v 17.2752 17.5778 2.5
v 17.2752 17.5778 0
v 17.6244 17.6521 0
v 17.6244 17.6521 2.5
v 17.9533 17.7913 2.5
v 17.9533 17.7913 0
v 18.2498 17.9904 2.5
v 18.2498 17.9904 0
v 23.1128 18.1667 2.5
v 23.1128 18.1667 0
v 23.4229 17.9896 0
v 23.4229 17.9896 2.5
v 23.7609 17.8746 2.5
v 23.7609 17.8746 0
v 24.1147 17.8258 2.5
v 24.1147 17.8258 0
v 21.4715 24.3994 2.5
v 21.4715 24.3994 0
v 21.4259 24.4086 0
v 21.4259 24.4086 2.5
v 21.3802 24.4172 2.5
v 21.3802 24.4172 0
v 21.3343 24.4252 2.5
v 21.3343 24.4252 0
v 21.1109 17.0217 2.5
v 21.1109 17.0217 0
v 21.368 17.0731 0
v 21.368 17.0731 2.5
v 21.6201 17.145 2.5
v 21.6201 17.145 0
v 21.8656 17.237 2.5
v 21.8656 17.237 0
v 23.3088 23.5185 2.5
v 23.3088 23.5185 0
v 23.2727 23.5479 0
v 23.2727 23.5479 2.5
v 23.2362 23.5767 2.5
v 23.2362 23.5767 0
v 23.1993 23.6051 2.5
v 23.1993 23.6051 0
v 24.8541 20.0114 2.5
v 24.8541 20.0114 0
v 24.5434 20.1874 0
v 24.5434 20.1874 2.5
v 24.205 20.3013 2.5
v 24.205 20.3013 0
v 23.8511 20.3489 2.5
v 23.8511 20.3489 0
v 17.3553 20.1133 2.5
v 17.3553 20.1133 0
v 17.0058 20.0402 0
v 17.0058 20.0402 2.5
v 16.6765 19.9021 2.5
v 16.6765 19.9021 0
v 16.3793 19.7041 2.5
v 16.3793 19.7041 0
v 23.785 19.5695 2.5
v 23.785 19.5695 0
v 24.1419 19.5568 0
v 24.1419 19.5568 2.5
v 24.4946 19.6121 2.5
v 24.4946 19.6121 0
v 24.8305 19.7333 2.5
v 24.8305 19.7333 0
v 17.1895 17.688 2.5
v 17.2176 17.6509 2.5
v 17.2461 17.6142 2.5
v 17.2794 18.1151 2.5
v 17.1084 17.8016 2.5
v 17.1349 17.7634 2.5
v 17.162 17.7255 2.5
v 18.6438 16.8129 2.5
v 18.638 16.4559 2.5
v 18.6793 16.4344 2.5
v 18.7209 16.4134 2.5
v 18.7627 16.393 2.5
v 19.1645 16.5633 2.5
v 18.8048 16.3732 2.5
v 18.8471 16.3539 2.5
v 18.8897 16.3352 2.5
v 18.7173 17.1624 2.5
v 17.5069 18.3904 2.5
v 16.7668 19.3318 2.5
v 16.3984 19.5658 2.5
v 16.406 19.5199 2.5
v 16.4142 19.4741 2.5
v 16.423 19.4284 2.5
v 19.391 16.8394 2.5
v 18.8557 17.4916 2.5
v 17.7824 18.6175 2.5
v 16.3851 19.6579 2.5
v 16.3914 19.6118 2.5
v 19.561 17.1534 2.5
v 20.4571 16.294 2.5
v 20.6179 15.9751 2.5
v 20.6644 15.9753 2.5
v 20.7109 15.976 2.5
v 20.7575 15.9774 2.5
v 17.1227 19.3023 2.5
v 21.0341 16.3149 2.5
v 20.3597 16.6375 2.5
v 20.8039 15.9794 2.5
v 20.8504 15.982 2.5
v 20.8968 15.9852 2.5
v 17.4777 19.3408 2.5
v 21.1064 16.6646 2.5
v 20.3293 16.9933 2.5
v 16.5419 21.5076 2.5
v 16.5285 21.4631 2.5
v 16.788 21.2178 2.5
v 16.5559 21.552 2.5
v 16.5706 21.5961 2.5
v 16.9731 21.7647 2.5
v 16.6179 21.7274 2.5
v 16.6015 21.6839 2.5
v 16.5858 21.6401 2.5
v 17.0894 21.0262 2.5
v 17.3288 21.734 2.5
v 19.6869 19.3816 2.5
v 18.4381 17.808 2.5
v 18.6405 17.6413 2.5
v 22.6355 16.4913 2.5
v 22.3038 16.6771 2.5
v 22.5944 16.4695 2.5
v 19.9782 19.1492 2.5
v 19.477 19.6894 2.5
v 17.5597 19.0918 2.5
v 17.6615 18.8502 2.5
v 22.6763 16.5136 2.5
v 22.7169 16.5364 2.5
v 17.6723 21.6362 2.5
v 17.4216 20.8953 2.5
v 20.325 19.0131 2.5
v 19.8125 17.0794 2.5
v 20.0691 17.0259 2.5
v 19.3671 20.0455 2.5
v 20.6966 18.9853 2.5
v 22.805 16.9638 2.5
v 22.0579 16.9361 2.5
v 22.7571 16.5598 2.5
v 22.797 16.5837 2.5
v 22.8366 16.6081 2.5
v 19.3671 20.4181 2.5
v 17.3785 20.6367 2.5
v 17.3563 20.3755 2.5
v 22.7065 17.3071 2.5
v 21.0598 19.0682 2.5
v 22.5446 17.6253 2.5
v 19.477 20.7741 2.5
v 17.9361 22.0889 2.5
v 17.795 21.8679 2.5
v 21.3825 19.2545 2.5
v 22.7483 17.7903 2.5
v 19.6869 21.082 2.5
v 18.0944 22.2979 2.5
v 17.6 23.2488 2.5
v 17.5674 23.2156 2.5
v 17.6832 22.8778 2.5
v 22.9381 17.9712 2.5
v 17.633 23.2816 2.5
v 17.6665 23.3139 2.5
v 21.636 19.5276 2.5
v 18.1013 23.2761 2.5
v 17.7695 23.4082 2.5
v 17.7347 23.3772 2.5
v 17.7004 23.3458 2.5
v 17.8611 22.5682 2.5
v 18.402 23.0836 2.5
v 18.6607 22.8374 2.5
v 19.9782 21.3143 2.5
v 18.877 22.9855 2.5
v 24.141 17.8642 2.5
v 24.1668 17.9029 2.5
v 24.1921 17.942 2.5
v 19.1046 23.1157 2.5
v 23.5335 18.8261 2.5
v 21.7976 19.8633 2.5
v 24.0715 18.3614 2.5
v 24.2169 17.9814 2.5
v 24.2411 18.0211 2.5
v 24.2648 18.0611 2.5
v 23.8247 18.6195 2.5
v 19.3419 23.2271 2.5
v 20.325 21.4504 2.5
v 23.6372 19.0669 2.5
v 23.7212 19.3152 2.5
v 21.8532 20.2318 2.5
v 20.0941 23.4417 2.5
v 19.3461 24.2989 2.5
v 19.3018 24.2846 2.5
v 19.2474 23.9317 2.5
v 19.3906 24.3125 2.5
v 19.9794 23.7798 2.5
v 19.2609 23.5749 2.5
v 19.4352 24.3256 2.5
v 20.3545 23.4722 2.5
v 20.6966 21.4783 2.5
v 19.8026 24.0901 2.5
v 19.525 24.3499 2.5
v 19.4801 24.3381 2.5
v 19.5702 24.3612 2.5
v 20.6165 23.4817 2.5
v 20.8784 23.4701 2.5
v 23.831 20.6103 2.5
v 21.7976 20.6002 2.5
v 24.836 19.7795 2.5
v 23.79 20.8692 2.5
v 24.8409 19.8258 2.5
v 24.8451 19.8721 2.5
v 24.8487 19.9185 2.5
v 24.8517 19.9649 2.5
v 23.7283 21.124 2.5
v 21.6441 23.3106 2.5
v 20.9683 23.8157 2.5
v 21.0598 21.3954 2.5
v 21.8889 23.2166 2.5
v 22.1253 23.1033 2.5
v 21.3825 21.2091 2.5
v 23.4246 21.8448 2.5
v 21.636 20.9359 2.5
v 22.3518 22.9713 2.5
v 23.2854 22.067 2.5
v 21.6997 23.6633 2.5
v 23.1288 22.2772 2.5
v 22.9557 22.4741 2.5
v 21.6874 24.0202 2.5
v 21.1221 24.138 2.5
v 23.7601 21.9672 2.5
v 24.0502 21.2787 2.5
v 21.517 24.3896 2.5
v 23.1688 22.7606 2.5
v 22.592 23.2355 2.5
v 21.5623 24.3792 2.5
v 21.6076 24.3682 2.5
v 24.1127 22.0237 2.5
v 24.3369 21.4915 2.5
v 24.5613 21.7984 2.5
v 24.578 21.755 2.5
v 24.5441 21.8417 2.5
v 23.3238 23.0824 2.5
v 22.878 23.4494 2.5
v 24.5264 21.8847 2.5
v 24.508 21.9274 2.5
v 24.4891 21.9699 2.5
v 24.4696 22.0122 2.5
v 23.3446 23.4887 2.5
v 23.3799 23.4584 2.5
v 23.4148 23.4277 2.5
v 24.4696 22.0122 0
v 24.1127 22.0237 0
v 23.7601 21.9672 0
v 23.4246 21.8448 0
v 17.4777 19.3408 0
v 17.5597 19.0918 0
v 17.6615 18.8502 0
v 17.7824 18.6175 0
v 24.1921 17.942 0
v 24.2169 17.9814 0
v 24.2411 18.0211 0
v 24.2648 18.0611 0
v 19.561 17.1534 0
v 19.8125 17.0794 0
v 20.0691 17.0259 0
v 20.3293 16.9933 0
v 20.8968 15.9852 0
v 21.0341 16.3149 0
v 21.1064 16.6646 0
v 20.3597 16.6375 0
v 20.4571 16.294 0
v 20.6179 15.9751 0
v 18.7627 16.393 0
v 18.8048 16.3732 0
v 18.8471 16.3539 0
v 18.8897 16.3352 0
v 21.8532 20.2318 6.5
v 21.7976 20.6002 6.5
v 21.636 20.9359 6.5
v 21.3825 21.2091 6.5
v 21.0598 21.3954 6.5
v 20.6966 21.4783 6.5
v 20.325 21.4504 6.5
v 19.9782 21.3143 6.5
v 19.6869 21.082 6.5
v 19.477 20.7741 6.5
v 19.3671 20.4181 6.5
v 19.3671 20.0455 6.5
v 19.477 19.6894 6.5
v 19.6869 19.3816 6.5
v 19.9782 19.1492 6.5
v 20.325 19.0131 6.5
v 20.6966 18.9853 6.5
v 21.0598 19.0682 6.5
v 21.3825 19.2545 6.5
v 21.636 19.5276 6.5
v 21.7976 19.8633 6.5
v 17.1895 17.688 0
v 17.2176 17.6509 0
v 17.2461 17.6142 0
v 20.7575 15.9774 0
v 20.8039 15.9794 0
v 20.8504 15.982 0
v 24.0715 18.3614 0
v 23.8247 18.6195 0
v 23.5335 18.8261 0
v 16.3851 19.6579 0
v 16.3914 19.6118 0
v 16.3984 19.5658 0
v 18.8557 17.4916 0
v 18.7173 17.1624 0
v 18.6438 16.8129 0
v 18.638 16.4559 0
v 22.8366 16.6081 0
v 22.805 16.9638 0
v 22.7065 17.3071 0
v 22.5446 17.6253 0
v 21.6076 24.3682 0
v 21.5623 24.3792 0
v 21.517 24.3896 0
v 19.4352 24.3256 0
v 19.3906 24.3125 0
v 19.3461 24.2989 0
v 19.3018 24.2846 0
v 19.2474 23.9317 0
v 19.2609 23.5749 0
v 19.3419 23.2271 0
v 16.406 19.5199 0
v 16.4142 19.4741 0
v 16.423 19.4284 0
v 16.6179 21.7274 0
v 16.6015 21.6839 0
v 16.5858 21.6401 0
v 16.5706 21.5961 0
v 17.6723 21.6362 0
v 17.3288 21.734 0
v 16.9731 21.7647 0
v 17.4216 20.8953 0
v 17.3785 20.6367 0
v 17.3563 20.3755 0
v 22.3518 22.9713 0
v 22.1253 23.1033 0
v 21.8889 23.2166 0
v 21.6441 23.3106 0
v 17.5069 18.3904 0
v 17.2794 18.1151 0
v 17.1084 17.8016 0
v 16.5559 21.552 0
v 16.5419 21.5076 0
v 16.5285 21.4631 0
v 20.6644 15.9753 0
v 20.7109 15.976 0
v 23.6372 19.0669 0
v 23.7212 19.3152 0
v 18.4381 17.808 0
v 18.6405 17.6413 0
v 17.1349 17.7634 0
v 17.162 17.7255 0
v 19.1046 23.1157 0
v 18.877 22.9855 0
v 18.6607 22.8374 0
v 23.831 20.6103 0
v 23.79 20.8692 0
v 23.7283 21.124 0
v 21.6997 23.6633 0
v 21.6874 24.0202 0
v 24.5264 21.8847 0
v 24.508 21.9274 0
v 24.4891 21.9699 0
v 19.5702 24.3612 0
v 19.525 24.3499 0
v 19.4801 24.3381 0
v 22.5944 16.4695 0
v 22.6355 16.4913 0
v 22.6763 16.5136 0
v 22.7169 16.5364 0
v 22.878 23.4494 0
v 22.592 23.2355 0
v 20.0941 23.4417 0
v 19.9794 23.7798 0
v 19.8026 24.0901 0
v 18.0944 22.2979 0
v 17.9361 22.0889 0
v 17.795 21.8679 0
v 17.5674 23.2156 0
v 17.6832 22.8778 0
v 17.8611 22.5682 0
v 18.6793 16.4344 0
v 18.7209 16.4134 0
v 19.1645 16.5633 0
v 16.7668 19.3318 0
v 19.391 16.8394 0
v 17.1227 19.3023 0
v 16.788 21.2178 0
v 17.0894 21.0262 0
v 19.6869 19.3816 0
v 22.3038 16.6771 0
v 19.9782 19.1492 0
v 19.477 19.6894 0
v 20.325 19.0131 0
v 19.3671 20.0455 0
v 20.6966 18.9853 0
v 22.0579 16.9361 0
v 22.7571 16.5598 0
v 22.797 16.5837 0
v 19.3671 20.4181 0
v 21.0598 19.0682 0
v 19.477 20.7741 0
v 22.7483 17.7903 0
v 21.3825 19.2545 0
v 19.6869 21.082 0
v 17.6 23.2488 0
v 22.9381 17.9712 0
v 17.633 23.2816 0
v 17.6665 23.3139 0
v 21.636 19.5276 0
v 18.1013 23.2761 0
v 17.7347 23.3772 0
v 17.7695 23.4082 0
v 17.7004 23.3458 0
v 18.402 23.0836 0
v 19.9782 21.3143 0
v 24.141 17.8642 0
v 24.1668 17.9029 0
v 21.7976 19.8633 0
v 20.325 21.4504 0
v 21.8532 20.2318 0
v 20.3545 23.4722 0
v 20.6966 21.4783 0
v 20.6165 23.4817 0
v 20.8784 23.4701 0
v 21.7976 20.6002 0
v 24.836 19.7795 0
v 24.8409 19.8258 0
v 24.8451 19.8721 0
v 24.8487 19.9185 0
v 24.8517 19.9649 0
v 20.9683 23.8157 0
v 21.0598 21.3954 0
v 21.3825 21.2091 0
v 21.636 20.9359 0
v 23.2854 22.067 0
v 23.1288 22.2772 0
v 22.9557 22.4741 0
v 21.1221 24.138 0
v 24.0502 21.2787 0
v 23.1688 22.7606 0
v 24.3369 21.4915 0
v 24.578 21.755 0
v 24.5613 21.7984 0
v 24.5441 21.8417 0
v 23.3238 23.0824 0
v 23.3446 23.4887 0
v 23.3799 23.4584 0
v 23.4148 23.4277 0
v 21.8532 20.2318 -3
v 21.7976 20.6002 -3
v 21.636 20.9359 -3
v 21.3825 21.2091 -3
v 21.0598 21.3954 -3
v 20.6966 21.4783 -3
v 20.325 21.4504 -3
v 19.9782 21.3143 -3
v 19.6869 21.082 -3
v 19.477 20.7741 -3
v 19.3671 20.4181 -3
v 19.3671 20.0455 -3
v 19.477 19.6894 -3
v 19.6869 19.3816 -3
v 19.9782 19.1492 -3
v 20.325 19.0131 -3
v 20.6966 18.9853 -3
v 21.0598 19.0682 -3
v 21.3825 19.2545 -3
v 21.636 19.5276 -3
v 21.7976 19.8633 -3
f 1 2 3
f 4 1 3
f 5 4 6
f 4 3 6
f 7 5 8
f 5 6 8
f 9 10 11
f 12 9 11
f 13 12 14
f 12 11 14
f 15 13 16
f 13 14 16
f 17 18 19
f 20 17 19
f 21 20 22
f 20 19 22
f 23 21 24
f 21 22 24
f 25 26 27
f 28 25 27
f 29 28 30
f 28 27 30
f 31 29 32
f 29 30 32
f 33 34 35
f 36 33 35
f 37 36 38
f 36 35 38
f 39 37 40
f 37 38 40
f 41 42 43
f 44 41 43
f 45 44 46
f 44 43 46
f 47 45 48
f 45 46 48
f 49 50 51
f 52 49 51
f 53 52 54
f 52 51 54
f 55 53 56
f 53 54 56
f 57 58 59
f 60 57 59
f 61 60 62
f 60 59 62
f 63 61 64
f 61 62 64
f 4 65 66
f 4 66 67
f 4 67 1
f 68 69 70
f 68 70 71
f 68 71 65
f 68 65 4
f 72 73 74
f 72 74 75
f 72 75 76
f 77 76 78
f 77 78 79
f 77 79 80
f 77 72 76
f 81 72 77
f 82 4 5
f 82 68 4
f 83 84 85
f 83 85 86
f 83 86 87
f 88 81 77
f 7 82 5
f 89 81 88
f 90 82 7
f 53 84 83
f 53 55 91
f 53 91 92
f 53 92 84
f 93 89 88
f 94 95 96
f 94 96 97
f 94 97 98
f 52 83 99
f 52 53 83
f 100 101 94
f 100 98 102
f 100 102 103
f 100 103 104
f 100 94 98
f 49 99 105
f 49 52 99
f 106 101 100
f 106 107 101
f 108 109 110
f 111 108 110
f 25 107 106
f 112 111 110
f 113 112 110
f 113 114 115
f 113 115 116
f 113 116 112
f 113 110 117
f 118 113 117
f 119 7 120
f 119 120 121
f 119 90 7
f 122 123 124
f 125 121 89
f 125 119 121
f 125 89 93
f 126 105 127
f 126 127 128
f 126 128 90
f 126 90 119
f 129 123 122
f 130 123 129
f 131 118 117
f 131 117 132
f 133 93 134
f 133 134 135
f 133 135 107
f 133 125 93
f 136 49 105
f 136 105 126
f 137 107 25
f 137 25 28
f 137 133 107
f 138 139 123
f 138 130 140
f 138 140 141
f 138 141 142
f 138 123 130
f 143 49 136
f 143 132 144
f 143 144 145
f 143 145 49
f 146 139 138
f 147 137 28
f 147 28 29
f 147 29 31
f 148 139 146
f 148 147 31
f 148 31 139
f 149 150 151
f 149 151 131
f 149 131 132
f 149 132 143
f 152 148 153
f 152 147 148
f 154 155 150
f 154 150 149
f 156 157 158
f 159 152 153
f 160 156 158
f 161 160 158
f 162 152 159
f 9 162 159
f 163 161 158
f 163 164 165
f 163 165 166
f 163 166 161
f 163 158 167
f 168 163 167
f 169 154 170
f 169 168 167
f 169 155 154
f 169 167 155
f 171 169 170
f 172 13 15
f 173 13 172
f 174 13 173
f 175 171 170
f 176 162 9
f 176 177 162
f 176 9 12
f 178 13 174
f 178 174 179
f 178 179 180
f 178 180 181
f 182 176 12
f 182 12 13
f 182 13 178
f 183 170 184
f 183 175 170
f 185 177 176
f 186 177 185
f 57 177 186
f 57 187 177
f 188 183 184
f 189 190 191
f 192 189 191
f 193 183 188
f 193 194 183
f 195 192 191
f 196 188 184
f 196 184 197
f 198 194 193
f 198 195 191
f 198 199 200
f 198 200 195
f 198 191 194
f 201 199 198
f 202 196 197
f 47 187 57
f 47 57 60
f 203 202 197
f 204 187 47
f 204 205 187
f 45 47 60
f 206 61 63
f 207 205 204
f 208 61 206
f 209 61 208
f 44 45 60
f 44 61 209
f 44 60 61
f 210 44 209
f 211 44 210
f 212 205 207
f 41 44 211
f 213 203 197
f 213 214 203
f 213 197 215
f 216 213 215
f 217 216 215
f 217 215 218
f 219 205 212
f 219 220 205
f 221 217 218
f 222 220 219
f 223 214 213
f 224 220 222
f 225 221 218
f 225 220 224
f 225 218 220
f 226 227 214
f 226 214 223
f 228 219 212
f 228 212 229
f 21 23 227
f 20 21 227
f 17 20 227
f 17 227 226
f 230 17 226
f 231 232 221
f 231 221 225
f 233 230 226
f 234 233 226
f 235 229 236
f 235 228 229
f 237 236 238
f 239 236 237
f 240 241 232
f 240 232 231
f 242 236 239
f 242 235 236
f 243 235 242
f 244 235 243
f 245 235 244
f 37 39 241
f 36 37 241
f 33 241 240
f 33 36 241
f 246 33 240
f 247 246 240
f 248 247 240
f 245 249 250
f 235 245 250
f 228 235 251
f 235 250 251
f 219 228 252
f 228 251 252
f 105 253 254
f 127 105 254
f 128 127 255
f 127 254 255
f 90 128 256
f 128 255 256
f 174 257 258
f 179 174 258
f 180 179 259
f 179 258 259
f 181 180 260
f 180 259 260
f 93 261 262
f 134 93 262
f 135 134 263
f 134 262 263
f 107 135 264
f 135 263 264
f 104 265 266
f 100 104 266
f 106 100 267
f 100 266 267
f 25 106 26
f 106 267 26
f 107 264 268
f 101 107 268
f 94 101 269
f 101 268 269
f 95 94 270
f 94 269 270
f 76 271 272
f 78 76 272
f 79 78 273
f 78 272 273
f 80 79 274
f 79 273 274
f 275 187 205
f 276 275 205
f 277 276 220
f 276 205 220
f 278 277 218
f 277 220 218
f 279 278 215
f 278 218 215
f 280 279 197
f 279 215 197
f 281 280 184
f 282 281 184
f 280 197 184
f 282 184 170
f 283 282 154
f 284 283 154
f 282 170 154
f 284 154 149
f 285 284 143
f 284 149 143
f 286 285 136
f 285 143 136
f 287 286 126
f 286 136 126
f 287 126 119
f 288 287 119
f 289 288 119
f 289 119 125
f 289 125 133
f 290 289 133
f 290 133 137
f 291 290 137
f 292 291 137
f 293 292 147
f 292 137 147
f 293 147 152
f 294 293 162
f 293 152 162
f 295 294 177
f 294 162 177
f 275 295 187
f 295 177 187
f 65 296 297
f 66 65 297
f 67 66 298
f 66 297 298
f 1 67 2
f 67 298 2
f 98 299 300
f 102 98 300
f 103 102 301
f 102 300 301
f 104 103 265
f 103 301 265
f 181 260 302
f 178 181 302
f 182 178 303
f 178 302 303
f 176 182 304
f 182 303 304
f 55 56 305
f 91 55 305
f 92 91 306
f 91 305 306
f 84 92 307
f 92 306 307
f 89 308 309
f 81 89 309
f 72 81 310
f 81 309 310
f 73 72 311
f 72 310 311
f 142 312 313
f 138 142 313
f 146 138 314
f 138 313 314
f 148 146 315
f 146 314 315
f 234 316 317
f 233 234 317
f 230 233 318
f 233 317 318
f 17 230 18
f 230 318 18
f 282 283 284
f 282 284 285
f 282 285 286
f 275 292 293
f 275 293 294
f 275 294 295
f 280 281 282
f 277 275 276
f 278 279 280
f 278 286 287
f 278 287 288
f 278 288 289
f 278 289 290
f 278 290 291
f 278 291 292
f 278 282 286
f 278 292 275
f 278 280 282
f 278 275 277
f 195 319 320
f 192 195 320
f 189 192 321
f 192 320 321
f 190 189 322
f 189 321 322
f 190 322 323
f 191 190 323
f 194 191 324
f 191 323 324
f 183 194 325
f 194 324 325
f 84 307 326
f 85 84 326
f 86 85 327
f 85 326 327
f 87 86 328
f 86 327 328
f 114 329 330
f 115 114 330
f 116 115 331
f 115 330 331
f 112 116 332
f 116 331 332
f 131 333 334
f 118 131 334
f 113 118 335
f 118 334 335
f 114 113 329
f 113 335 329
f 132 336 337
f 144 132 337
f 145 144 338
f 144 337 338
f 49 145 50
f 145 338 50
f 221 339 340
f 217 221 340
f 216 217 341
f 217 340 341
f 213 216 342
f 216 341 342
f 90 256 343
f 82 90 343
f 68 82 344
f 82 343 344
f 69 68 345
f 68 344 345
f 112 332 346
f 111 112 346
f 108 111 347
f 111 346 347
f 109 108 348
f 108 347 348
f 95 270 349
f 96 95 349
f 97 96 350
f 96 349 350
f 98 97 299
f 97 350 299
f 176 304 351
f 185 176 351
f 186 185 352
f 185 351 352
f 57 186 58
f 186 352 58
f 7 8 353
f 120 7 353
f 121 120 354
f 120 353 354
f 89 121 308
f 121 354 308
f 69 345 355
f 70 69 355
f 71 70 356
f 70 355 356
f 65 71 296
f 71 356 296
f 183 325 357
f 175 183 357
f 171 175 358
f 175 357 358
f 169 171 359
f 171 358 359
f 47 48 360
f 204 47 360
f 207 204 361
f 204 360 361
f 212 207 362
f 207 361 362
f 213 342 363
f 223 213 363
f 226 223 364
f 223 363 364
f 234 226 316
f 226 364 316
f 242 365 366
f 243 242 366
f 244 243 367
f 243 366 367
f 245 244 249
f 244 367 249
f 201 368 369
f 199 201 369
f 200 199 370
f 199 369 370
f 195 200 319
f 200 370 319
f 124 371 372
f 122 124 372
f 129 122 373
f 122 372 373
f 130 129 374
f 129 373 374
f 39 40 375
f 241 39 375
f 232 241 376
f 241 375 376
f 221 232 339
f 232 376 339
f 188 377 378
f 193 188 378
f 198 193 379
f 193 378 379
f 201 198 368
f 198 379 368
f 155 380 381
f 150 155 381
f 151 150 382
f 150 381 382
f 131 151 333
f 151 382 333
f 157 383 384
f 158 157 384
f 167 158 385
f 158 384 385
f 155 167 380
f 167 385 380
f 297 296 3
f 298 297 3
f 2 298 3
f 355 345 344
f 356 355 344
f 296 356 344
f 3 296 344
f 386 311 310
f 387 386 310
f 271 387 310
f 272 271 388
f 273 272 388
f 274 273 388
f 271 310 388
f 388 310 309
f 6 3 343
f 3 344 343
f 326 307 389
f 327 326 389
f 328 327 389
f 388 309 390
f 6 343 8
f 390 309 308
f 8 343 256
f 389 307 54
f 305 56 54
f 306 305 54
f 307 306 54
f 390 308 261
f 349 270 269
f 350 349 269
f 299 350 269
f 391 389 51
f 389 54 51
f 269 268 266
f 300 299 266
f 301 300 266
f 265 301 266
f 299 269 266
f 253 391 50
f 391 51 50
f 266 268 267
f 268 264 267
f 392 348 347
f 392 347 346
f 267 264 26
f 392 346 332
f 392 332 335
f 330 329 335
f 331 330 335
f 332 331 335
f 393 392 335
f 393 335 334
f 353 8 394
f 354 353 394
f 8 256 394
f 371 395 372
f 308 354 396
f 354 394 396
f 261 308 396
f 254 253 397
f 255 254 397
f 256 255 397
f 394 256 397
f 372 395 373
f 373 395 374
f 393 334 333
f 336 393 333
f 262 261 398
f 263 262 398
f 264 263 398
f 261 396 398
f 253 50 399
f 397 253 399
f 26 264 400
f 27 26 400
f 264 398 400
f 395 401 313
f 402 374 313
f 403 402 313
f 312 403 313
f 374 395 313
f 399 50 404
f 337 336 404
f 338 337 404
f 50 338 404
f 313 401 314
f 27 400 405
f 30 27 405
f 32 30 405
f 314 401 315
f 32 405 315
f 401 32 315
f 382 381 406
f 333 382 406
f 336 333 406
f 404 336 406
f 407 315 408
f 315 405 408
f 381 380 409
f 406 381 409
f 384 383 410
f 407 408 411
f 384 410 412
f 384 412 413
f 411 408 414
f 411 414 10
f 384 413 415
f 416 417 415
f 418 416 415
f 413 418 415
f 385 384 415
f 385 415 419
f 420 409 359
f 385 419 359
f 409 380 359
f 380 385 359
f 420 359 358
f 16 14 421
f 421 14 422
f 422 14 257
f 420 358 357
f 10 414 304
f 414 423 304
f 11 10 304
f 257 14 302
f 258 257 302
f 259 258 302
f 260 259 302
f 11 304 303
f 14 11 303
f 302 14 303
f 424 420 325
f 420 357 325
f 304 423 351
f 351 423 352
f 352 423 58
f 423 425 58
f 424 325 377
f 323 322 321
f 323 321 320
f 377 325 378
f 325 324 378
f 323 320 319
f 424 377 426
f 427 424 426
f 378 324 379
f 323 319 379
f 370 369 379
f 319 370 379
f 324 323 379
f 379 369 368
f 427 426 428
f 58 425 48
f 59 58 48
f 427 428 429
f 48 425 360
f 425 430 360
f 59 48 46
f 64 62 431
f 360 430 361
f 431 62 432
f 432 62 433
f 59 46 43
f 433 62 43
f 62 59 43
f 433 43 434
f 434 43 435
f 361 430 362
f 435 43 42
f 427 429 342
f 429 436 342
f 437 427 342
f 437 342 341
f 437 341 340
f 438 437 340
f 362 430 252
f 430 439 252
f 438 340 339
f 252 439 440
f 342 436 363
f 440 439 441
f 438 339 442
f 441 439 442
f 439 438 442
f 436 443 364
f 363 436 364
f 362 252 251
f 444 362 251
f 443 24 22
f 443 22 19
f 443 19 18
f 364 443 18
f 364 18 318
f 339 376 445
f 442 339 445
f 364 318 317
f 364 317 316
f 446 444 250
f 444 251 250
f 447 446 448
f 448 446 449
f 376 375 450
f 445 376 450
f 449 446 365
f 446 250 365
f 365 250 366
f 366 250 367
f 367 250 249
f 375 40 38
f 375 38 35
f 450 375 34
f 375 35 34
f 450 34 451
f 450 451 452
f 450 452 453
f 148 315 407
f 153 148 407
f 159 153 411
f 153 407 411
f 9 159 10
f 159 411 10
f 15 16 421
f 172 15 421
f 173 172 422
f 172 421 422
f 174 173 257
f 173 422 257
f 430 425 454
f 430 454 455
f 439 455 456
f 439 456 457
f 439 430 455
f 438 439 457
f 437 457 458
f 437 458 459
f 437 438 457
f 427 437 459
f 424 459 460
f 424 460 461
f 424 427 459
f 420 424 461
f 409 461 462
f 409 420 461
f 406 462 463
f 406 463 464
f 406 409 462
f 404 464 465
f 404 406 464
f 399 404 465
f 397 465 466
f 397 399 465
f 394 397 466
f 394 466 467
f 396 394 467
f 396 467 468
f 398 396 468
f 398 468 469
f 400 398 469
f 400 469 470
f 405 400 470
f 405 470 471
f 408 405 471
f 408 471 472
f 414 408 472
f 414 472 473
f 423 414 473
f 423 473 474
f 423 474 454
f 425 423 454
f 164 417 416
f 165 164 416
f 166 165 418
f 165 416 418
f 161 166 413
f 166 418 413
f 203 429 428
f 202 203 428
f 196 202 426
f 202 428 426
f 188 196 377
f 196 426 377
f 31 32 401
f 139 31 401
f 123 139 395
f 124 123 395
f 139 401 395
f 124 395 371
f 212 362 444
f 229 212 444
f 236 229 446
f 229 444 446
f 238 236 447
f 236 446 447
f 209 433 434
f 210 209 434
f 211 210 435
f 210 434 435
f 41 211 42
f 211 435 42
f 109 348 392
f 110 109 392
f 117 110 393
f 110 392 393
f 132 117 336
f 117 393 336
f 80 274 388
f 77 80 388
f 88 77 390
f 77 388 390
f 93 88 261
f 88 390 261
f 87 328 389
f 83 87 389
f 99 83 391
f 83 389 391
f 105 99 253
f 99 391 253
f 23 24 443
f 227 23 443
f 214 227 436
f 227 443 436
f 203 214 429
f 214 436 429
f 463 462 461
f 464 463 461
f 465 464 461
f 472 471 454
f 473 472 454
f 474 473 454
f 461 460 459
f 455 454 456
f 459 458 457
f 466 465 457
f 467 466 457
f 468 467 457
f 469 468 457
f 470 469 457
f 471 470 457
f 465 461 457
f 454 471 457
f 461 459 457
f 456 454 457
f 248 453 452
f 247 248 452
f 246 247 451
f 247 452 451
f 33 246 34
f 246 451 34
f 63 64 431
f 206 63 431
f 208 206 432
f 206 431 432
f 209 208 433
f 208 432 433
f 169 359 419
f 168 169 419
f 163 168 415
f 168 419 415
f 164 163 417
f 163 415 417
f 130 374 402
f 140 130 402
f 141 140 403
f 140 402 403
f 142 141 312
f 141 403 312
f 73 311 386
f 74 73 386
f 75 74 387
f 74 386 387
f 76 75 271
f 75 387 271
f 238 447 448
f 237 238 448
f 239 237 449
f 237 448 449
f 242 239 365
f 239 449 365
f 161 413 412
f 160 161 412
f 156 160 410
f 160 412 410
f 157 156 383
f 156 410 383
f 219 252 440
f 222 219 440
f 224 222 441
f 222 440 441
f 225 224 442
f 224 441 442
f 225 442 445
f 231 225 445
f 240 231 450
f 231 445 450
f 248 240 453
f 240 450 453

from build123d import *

# Parameters (mm, degrees)
F1_DEPTH      = 2.5
F2_R          = 1.25
F3_DEPTH      = 4
F3_DEPTH_BACK = 5.5


with BuildPart() as f1:
    # F0 (on Top) → F1 (new body)
    with BuildSketch(Plane.XY):
        with BuildLine():
            ThreePointArc((16.398417, 19.565806), (16.410022, 19.496985), (16.422997, 19.428409))
            ThreePointArc((16.422997, 19.428409), (16.944024, 19.308565), (17.477685, 19.340784))
            ThreePointArc((17.477685, 19.340784), (17.39318, 19.723361), (17.355326, 20.113326))
            ThreePointArc((17.355326, 20.113326), (16.837828, 19.979058), (16.379336, 19.704073))
            ThreePointArc((16.379336, 19.704073), (16.388187, 19.634844), (16.398417, 19.565806))
        make_face()
        with BuildLine():
            ThreePointArc((17.355326, 20.113326), (17.39318, 19.723361), (17.477685, 19.340784))
            ThreePointArc((17.477685, 19.340784), (17.608128, 18.969934), (17.782392, 18.617547))
            ThreePointArc((17.782392, 18.617547), (17.997136, 18.289841), (18.249753, 17.990357))
            ThreePointArc((18.249753, 17.990357), (18.537597, 17.722606), (18.855663, 17.491567))
            ThreePointArc((18.855663, 17.491567), (19.198102, 17.301194), (19.560961, 17.153412))
            ThreePointArc((19.560961, 17.153412), (19.940264, 17.050097), (20.329266, 16.993335))
            ThreePointArc((20.329266, 16.993335), (20.720951, 16.983908), (21.110925, 17.021682))
            ThreePointArc((21.110925, 17.021682), (21.494794, 17.106472), (21.865617, 17.23699))
            ThreePointArc((21.865617, 17.23699), (22.216818, 17.410668), (22.544568, 17.625345))
            ThreePointArc((22.544568, 17.625345), (22.845063, 17.878816), (23.112756, 18.166714))
            ThreePointArc((23.112756, 18.166714), (23.343017, 18.483709), (23.533459, 18.826109))
            ThreePointArc((23.533459, 18.826109), (23.681741, 19.190194), (23.784978, 19.569518))
            ThreePointArc((23.784978, 19.569518), (23.836075, 19.898895), (23.853167, 20.231773))
            ThreePointArc((23.853167, 20.231773), (23.85264, 20.290343), (23.851056, 20.348894))
            ThreePointArc((23.851056, 20.348894), (23.813154, 20.740185), (23.728286, 21.124037))
            ThreePointArc((23.728286, 21.124037), (23.598207, 21.493611), (23.424601, 21.844848))
            ThreePointArc((23.424601, 21.844848), (23.209199, 22.173705), (22.955667, 22.474148))
            ThreePointArc((22.955667, 22.474148), (22.668738, 22.74094), (22.351789, 22.971266))
            ThreePointArc((22.351789, 22.971266), (22.008233, 23.162351), (21.644118, 23.310558))
            ThreePointArc((21.644118, 23.310558), (21.266071, 23.413448), (20.87839, 23.470098))
            ThreePointArc((20.87839, 23.470098), (20.485383, 23.479638), (20.094101, 23.441656))
            ThreePointArc((20.094101, 23.441656), (19.711541, 23.357073), (19.34194, 23.22707))
            ThreePointArc((19.34194, 23.22707), (18.989517, 23.052878), (18.660704, 22.837408))
            ThreePointArc((18.660704, 22.837408), (18.361272, 22.584729), (18.094422, 22.297855))
            ThreePointArc((18.094422, 22.297855), (17.863318, 21.979836), (17.672302, 21.636241))
            ThreePointArc((17.672302, 21.636241), (17.524594, 21.273352), (17.421627, 20.895325))
            ThreePointArc((17.421627, 20.895325), (17.364786, 20.506335), (17.355326, 20.113326))
        make_face()
        with BuildLine():
            ThreePointArc((18.249753, 17.990357), (17.997136, 18.289841), (17.782392, 18.617547))
            ThreePointArc((17.782392, 18.617547), (17.386568, 18.258165), (17.108384, 17.801605))
            ThreePointArc((17.108384, 17.801605), (17.148394, 17.74442), (17.189536, 17.688044))
            ThreePointArc((17.189536, 17.688044), (17.231794, 17.632499), (17.275152, 17.577808))
            ThreePointArc((17.275152, 17.577808), (17.792193, 17.713824), (18.249753, 17.990357))
        make_face()
        with BuildLine():
            ThreePointArc((16.528468, 21.463052), (16.934121, 21.114802), (17.421627, 20.895325))
            ThreePointArc((17.421627, 20.895325), (17.524594, 21.273352), (17.672302, 21.636241))
            ThreePointArc((17.672302, 21.636241), (17.151683, 21.757845), (16.617916, 21.72743))
            ThreePointArc((16.617916, 21.72743), (16.593581, 21.662018), (16.570556, 21.596133))
            ThreePointArc((16.570556, 21.596133), (16.548849, 21.529802), (16.528468, 21.463052))
        make_face()
        with BuildLine():
            ThreePointArc((19.560961, 17.153412), (19.198102, 17.301194), (18.855663, 17.491567))
            ThreePointArc((18.855663, 17.491567), (18.672191, 16.989401), (18.638046, 16.45586))
            ThreePointArc((18.638046, 16.45586), (18.700048, 16.423818), (18.762677, 16.393019))
            ThreePointArc((18.762677, 16.393019), (18.825908, 16.363475), (18.889715, 16.335197))
            ThreePointArc((18.889715, 16.335197), (19.284322, 16.695915), (19.560961, 17.153412))
        make_face()
        with BuildLine():
            ThreePointArc((17.567404, 23.215623), (17.764752, 22.718747), (18.094422, 22.297855))
            ThreePointArc((18.094422, 22.297855), (18.361272, 22.584729), (18.660704, 22.837408))
            ThreePointArc((18.660704, 22.837408), (18.256231, 23.187028), (17.769469, 23.40815))
            ThreePointArc((17.769469, 23.40815), (17.717523, 23.361539), (17.666517, 23.313902))
            ThreePointArc((17.666517, 23.313902), (17.616471, 23.265257), (17.567404, 23.215623))
        make_face()
        with BuildLine():
            ThreePointArc((21.110925, 17.021682), (20.720951, 16.983908), (20.329266, 16.993335))
            ThreePointArc((20.329266, 16.993335), (20.400178, 16.463426), (20.617893, 15.97513))
            ThreePointArc((20.617893, 15.97513), (20.687684, 15.975573), (20.757452, 15.977407))
            ThreePointArc((20.757452, 15.977407), (20.82717, 15.980631), (20.896809, 15.985245))
            ThreePointArc((20.896809, 15.985245), (21.078583, 16.488028), (21.110925, 17.021682))
        make_face()
        with BuildLine():
            ThreePointArc((19.301797, 24.284631), (19.24563, 23.752956), (19.34194, 23.22707))
            ThreePointArc((19.34194, 23.22707), (19.711541, 23.357073), (20.094101, 23.441656))
            ThreePointArc((20.094101, 23.441656), (19.898434, 23.939197), (19.570188, 24.361201))
            ThreePointArc((19.570188, 24.361201), (19.502531, 24.344069), (19.435229, 24.325592))
            ThreePointArc((19.435229, 24.325592), (19.368309, 24.305777), (19.301797, 24.284631))
        make_face()
        with BuildLine():
            ThreePointArc((22.544568, 17.625345), (22.216818, 17.410668), (21.865617, 17.23699))
            ThreePointArc((21.865617, 17.23699), (22.174667, 16.800734), (22.594367, 16.469547))
            ThreePointArc((22.594367, 16.469547), (22.655958, 16.502372), (22.716882, 16.536418))
            ThreePointArc((22.716882, 16.536418), (22.777116, 16.571673), (22.836634, 16.608122))
            ThreePointArc((22.836634, 16.608122), (22.763932, 17.137788), (22.544568, 17.625345))
        make_face()
        with BuildLine():
            ThreePointArc((21.334318, 24.425177), (21.037503, 23.980505), (20.87839, 23.470098))
            ThreePointArc((20.87839, 23.470098), (21.266071, 23.413448), (21.644118, 23.310558))
            ThreePointArc((21.644118, 23.310558), (21.702083, 23.84204), (21.607551, 24.368249))
            ThreePointArc((21.607551, 24.368249), (21.539682, 24.384522), (21.471502, 24.399438))
            ThreePointArc((21.471502, 24.399438), (21.403039, 24.412991), (21.334318, 24.425177))
        make_face()
        with BuildLine():
            ThreePointArc((23.533459, 18.826109), (23.343017, 18.483709), (23.112756, 18.166714))
            ThreePointArc((23.112756, 18.166714), (23.589145, 17.924051), (24.11468, 17.825843))
            ThreePointArc((24.11468, 17.825843), (24.153962, 17.883531), (24.192086, 17.941991))
            ThreePointArc((24.192086, 17.941991), (24.229036, 18.0012), (24.264799, 18.061133))
            ThreePointArc((24.264799, 18.061133), (23.954275, 18.496343), (23.533459, 18.826109))
        make_face()
        with BuildLine():
            ThreePointArc((23.199342, 23.605065), (22.729875, 23.349265), (22.351789, 22.971266))
            ThreePointArc((22.351789, 22.971266), (22.668738, 22.74094), (22.955667, 22.474148))
            ThreePointArc((22.955667, 22.474148), (23.253983, 22.917814), (23.414821, 23.42768))
            ThreePointArc((23.414821, 23.42768), (23.362289, 23.473629), (23.30885, 23.518521))
            ThreePointArc((23.30885, 23.518521), (23.254527, 23.562339), (23.199342, 23.605065))
        make_face()
        with BuildLine():
            ThreePointArc((23.853167, 20.231773), (23.836075, 19.898895), (23.784978, 19.569518))
            ThreePointArc((23.784978, 19.569518), (24.319571, 19.57604), (24.830549, 19.733309))
            ThreePointArc((24.830549, 19.733309), (24.838522, 19.802645), (24.845111, 19.872125))
            ThreePointArc((24.845111, 19.872125), (24.850314, 19.941724), (24.854127, 20.011412))
            ThreePointArc((24.854127, 20.011412), (24.376921, 20.252463), (23.851056, 20.348894))
            ThreePointArc((23.851056, 20.348894), (23.85264, 20.290343), (23.853167, 20.231773))
        make_face()
        with BuildLine():
            ThreePointArc((24.469612, 22.012172), (23.935045, 22.003844), (23.424601, 21.844848))
            ThreePointArc((23.424601, 21.844848), (23.598207, 21.493611), (23.728286, 21.124037))
            ThreePointArc((23.728286, 21.124037), (24.198614, 21.378249), (24.577975, 21.754968))
            ThreePointArc((24.577975, 21.754968), (24.552814, 21.820066), (24.526359, 21.884651))
            ThreePointArc((24.526359, 21.884651), (24.498621, 21.948694), (24.469612, 22.012172))
        make_face()
    extrude(amount=F1_DEPTH)

    # F2 (on face) → F3 (join, two sides)
    with BuildSketch(Plane.XY.offset(2.5)) as f3_sk:
        with Locations((20.603167, 20.231773)):
            Circle(F2_R)
    extrude(amount=F3_DEPTH)
    extrude(f3_sk.sketch, amount=-F3_DEPTH_BACK)


solid = f1.part
